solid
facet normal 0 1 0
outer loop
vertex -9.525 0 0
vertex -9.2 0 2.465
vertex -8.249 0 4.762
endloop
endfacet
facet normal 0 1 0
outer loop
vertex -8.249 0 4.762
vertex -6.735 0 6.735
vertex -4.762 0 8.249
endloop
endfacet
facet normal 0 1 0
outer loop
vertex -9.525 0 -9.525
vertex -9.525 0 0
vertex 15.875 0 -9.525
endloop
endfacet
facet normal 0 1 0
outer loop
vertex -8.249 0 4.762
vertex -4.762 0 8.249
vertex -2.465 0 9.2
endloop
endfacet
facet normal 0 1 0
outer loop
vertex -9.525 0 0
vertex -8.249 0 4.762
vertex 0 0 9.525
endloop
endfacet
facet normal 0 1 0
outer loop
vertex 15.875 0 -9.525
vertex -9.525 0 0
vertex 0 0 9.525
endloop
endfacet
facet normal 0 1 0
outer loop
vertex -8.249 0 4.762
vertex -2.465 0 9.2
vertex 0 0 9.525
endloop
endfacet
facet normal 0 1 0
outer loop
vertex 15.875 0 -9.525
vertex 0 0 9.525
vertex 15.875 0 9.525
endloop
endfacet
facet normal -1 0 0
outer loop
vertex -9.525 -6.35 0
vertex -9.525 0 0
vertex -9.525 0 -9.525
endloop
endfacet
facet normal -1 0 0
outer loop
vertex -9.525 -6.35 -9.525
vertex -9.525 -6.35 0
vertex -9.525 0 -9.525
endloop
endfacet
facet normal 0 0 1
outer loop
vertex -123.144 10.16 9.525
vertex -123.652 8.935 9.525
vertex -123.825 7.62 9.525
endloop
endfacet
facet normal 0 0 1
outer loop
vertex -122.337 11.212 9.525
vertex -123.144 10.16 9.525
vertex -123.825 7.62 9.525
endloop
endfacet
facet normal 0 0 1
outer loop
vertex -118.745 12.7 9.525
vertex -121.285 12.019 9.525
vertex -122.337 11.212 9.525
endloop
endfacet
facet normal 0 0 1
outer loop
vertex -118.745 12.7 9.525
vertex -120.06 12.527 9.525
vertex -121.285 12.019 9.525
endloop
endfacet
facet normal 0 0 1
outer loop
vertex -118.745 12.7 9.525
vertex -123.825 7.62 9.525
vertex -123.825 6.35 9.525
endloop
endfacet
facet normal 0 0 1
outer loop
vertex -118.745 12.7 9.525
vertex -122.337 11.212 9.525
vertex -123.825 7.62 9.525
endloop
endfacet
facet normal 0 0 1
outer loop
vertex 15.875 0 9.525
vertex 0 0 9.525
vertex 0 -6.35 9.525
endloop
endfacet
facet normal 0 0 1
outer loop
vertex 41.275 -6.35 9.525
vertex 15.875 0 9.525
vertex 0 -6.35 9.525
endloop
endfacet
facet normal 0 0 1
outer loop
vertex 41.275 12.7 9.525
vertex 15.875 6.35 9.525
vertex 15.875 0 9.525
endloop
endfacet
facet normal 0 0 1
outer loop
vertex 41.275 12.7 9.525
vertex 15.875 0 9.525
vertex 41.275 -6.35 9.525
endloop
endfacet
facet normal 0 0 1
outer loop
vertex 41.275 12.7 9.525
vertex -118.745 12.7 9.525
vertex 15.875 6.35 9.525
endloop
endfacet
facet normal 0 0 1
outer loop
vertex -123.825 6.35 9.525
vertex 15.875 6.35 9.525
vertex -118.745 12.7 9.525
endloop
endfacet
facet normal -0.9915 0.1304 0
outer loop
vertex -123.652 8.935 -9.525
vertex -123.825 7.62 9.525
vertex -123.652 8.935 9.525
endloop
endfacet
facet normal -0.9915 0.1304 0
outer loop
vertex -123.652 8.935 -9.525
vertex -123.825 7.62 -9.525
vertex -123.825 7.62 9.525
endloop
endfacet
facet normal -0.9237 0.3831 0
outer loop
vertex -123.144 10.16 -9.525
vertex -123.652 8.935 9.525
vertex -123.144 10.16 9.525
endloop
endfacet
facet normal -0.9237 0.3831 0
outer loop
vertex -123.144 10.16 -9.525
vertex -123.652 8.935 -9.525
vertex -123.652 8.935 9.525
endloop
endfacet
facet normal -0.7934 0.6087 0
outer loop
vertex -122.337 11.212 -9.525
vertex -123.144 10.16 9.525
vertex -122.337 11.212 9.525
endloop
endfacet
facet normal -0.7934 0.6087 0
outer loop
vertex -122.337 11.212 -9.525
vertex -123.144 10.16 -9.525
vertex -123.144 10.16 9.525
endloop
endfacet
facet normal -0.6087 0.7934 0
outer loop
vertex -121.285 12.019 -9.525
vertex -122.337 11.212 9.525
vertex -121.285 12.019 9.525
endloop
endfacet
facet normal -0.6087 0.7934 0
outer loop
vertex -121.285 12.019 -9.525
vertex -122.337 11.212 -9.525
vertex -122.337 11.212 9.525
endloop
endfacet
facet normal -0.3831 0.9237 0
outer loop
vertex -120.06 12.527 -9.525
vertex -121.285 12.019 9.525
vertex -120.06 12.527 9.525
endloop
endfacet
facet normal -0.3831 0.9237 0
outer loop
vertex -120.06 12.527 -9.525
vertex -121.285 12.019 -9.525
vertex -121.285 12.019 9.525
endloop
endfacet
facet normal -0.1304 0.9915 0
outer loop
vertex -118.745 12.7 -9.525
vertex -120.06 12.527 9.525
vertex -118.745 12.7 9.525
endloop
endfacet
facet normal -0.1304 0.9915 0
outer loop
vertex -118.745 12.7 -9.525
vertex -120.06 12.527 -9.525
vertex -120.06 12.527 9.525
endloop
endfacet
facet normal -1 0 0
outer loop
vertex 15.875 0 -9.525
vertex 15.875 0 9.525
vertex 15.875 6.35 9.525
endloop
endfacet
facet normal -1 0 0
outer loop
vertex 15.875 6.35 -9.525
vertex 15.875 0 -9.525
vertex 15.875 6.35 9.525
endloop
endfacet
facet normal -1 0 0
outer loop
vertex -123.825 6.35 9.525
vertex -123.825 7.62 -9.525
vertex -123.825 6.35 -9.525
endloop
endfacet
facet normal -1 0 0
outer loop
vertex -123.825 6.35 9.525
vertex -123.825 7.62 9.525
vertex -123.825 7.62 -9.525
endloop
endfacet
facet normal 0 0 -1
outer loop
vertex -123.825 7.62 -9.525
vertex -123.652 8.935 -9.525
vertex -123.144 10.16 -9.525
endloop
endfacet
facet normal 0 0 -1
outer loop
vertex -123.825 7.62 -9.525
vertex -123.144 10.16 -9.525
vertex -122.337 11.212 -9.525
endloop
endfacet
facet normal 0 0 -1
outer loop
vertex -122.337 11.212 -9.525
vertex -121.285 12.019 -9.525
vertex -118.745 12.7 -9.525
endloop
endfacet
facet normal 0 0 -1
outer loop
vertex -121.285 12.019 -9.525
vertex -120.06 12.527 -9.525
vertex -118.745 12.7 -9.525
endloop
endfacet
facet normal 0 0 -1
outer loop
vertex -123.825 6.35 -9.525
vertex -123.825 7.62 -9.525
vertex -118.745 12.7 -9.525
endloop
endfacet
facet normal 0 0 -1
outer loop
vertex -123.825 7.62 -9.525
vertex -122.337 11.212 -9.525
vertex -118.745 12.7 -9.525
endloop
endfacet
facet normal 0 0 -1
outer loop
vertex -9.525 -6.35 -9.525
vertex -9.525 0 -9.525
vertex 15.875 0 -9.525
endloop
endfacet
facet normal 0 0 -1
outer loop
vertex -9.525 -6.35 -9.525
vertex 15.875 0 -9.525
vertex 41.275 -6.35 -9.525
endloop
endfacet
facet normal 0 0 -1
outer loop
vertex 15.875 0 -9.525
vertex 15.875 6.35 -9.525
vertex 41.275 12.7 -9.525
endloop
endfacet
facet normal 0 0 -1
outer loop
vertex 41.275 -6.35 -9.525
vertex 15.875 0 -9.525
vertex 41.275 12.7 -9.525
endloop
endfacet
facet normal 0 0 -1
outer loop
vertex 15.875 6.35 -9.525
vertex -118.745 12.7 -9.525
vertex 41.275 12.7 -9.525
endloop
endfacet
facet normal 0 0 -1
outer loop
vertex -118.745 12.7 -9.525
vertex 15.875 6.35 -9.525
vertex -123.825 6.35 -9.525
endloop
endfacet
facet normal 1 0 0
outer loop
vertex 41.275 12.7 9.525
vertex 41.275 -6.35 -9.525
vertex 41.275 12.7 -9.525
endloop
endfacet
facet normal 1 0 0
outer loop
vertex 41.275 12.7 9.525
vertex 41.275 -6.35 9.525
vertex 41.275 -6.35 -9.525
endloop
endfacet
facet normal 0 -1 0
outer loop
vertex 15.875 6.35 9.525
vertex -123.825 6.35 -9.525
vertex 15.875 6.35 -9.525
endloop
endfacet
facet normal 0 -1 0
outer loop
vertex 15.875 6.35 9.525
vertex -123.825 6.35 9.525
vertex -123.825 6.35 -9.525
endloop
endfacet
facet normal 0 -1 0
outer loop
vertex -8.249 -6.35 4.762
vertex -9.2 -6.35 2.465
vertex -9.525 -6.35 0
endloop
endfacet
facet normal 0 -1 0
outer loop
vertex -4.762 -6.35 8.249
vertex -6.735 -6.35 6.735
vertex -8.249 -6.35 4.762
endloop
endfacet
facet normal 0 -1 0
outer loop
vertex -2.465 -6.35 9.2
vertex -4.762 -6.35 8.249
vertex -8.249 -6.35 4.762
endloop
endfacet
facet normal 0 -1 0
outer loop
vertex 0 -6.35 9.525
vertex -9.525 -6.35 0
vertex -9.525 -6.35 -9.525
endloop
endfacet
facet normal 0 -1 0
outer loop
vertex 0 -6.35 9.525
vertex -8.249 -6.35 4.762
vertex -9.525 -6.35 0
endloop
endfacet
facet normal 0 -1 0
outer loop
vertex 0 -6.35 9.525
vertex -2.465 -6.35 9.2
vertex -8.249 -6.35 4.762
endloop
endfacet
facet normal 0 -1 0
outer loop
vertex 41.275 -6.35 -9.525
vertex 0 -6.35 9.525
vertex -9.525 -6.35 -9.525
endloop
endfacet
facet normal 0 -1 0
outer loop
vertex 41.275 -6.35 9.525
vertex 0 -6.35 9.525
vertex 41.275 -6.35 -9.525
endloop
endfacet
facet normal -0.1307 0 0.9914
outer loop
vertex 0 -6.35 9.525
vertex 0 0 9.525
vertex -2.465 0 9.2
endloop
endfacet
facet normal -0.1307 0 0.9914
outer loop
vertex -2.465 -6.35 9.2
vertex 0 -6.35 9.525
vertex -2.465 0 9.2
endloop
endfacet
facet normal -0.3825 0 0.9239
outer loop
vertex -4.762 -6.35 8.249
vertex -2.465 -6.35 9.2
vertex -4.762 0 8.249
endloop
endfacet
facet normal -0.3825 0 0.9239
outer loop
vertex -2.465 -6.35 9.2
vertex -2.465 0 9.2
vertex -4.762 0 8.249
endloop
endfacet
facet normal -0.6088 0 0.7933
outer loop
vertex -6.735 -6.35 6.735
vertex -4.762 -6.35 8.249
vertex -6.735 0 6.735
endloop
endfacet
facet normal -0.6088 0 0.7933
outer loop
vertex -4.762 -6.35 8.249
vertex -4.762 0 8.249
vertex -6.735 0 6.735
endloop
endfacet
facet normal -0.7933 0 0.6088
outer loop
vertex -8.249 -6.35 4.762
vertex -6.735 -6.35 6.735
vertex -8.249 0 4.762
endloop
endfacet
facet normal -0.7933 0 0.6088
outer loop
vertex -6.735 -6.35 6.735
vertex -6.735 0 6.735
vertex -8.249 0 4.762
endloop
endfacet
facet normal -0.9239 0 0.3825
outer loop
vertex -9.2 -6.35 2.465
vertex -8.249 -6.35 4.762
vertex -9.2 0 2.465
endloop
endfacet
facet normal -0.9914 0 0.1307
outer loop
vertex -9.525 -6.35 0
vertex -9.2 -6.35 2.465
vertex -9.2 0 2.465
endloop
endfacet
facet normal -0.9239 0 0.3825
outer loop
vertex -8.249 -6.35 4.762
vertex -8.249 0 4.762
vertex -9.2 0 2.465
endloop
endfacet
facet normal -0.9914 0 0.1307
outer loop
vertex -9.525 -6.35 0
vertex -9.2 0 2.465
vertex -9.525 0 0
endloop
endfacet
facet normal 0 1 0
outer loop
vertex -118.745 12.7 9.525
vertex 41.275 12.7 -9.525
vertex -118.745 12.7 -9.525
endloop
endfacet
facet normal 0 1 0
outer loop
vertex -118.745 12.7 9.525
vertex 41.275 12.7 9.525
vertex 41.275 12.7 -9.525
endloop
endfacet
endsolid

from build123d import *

# Parameters (mm, degrees)
F1_DEPTH = 6.35
F2_W     = 25.4
F2_H     = 6.35
F3_DEPTH = 9.525
F4_R     = 5.08


with BuildPart() as f1:
    # F0 (on Front) → F1 (new body)
    with BuildSketch(Plane.XZ):
        with BuildLine():
            Line((-9.525, -9.525), (9.525, -9.525))
            Line((9.525, -9.525), (15.875, -9.525))
            Line((15.875, -9.525), (41.275, -9.525))
            Line((41.275, -9.525), (41.275, 9.525))
            Line((41.275, 9.525), (15.875, 9.525))
            Line((15.875, 9.525), (9.525, 9.525))
            Line((9.525, 9.525), (0, 9.525))
            ThreePointArc((0, 9.525), (-6.735192, 6.735192), (-9.525, 0))
            Line((-9.525, 0), (-9.525, -9.525))
        make_face()
    extrude(amount=F1_DEPTH)

    # F2 (on Top) → F3 (join, symmetric)
    with BuildSketch(Plane.XY):
        with Locations((28.575, 3.175)):
            Rectangle(F2_W, F2_H)
        Polygon((-123.825, 6.35), (15.875, 6.35), (41.275, 6.35), (41.275, 12.7), (-123.825, 12.7), align=None)
    extrude(amount=F3_DEPTH, both=True)

    # F4
    f4_edges = [f1.edges().sort_by_distance(p)[0] for p in [
        (-123.825, 12.7, 0),
    ]]
    fillet(f4_edges, radius=F4_R)


solid = f1.part
